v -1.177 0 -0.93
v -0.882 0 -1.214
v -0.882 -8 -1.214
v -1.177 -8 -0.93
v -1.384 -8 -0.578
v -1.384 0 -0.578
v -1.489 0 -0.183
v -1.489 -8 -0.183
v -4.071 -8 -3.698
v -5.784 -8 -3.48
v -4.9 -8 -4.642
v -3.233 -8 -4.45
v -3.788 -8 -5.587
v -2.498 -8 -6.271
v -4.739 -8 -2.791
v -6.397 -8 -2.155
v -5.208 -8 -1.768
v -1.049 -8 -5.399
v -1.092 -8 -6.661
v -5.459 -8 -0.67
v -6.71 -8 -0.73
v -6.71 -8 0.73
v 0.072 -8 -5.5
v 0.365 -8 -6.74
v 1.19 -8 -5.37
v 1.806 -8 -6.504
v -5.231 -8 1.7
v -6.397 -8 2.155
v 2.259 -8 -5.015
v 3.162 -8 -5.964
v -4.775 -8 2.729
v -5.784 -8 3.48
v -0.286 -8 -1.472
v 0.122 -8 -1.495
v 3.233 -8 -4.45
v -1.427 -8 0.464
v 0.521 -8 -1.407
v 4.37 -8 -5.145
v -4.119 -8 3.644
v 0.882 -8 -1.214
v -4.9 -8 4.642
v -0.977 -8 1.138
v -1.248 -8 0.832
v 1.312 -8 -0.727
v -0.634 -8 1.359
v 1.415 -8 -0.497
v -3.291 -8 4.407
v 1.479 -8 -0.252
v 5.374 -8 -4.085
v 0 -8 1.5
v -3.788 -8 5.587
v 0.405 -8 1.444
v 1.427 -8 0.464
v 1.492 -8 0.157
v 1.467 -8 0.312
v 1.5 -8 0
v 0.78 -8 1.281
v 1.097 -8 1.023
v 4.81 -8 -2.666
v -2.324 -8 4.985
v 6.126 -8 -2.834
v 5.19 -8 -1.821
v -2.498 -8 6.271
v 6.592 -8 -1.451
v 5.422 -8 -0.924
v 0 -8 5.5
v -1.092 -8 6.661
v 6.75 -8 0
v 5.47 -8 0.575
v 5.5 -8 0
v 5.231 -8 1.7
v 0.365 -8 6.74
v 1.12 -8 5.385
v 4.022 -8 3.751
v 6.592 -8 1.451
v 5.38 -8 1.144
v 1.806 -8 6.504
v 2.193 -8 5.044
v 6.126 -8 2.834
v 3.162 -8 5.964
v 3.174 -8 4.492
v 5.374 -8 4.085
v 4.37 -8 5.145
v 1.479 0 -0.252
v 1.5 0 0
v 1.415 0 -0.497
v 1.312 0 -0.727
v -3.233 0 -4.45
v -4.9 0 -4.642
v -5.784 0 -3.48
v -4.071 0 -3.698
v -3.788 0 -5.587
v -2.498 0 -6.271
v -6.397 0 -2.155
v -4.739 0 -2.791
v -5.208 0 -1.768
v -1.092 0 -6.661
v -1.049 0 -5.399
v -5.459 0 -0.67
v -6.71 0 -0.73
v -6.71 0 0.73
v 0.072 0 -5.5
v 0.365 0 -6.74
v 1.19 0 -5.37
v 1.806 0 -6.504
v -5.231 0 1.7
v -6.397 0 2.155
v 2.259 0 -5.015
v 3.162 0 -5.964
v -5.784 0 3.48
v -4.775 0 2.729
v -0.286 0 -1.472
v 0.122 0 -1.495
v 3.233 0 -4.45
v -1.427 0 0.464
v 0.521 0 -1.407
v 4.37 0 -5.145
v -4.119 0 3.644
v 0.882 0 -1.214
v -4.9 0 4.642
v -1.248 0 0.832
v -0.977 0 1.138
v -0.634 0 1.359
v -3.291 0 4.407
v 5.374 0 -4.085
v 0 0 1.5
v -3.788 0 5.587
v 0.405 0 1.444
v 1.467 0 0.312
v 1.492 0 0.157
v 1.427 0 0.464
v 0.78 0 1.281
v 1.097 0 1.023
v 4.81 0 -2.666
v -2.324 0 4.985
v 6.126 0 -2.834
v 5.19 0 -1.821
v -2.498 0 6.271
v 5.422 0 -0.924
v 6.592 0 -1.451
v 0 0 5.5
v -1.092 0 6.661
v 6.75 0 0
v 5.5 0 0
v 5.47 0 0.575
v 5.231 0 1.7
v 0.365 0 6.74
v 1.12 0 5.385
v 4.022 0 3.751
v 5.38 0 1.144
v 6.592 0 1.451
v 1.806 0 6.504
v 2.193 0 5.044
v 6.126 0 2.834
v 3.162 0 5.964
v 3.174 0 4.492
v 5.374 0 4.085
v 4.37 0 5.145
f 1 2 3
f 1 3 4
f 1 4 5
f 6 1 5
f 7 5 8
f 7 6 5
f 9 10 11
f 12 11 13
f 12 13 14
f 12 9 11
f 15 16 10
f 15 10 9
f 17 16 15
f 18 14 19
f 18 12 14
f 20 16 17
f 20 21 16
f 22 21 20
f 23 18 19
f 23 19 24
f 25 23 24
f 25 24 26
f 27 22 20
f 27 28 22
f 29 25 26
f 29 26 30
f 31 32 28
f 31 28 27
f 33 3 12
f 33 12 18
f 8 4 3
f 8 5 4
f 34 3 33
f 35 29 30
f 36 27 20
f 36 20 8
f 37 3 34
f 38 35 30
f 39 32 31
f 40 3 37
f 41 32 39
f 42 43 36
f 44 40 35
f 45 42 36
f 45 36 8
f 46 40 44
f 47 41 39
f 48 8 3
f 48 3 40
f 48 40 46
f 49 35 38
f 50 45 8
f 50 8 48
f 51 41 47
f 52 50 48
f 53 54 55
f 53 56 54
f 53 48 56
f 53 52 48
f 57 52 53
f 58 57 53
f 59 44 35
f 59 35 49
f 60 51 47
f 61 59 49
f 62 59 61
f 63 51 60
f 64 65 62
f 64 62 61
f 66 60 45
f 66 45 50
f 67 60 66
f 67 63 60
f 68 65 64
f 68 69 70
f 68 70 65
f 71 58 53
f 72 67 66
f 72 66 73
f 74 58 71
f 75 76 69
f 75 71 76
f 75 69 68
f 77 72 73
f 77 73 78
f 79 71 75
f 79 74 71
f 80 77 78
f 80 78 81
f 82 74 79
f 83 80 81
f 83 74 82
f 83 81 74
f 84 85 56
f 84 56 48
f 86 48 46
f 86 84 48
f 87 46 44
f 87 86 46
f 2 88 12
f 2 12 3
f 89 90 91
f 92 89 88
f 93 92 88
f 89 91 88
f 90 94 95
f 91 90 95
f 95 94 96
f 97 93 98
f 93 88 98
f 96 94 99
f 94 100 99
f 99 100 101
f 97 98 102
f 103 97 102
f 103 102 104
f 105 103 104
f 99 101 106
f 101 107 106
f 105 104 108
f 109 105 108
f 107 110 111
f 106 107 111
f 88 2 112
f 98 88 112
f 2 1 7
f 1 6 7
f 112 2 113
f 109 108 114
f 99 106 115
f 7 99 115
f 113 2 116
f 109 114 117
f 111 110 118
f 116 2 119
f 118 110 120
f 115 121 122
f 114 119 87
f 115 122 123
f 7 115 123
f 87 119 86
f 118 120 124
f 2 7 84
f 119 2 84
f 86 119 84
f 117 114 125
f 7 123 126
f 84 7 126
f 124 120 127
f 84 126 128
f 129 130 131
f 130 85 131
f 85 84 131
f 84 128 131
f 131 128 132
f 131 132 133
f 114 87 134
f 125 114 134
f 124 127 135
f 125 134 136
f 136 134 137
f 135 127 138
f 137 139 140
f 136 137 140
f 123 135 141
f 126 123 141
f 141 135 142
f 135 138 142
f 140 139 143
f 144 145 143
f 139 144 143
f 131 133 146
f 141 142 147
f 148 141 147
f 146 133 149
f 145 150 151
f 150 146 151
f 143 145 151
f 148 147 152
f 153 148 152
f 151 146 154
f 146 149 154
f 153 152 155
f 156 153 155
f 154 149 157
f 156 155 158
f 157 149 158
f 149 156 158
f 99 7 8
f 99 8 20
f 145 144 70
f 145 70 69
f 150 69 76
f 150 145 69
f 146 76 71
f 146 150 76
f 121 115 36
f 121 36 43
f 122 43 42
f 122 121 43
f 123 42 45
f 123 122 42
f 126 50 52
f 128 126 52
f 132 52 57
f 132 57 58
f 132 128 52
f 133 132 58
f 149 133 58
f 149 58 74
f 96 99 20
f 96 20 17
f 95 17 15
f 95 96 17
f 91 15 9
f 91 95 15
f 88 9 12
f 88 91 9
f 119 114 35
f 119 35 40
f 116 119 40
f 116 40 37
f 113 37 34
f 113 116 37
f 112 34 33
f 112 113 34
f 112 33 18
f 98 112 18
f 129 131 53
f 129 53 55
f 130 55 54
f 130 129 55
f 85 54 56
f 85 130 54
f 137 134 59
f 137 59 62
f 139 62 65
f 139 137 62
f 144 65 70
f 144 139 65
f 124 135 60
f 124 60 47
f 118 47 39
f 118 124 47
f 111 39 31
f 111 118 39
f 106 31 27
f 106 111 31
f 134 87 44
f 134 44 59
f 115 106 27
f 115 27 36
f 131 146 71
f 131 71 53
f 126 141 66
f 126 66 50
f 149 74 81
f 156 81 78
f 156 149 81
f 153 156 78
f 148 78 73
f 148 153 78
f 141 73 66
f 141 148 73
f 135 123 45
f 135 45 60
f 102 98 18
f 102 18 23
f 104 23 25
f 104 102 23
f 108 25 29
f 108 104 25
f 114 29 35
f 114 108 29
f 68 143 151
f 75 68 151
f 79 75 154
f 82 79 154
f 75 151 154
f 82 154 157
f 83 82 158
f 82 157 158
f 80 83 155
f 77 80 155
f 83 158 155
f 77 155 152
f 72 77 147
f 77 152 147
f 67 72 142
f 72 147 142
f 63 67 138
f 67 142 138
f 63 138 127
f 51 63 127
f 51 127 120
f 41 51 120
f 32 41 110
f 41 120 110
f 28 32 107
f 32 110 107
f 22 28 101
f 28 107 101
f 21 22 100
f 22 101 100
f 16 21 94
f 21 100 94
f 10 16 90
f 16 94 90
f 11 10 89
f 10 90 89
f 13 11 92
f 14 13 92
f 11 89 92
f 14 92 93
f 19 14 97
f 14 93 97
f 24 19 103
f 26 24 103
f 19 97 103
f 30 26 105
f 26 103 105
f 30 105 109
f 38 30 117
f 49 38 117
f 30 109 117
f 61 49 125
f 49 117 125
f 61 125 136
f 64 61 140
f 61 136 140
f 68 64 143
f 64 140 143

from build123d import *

# Parameters (mm, degrees)
F0_R     = 6.75
F1_DEPTH = 8
F3_DEPTH = 8


with BuildPart() as f1:
    # F0 (on Front) → F1 (new body)
    with BuildSketch(Plane.XZ):
        Circle(F0_R)
    extrude(amount=F1_DEPTH)

    # F2 (on Front) → F3 (cut)
    with BuildSketch(Plane.XZ):
        with BuildLine():
            ThreePointArc((1.426585, 0.463525), (1.481533, 0.234652), (1.5, 0))
            ThreePointArc((1.5, 0), (1.452221, -0.37557), (1.31193, -0.727214))
            Line((1.31193, -0.727214), (4.810408, -2.666453))
            ThreePointArc((4.810408, -2.666453), (5.324812, -1.37709), (5.5, 0))
            ThreePointArc((5.5, 0), (5.432286, 0.86039), (5.230811, 1.699593))
            Line((5.230811, 1.699593), (1.426585, 0.463525))
        make_face()
        with BuildLine():
            ThreePointArc((0, 1.5), (0.598124, 1.37559), (1.097031, 1.022998))
            Line((1.097031, 1.022998), (4.022445, 3.750991))
            ThreePointArc((4.022445, 3.750991), (2.19312, 5.04383), (0, 5.5))
            Line((0, 5.5), (0, 1.5))
        make_face()
        with BuildLine():
            ThreePointArc((-1.426585, 0.463525), (-1.123434, 0.99393), (-0.633927, 1.359462))
            Line((-0.633927, 1.359462), (-2.3244, 4.984693))
            ThreePointArc((-2.3244, 4.984693), (-4.119256, 3.64441), (-5.230811, 1.699593))
            Line((-5.230811, 1.699593), (-1.426585, 0.463525))
        make_face()
        with BuildLine():
            Line((3.232819, -4.449593), (0.881678, -1.213525))
            ThreePointArc((0.881678, -1.213525), (0.324659, -1.464444), (-0.286213, -1.472441))
            Line((-0.286213, -1.472441), (-1.049449, -5.39895))
            ThreePointArc((-1.049449, -5.39895), (1.190418, -5.369628), (3.232819, -4.449593))
        make_face()
        with BuildLine():
            Line((-3.232819, -4.449593), (-0.881678, -1.213525))
            ThreePointArc((-0.881678, -1.213525), (-1.292444, -0.761308), (-1.488819, -0.182804))
            Line((-1.488819, -0.182804), (-5.459004, -0.670281))
            ThreePointArc((-5.459004, -0.670281), (-4.73896, -2.791461), (-3.232819, -4.449593))
        make_face()
    extrude(amount=F3_DEPTH, mode=Mode.SUBTRACT)


solid = f1.part
